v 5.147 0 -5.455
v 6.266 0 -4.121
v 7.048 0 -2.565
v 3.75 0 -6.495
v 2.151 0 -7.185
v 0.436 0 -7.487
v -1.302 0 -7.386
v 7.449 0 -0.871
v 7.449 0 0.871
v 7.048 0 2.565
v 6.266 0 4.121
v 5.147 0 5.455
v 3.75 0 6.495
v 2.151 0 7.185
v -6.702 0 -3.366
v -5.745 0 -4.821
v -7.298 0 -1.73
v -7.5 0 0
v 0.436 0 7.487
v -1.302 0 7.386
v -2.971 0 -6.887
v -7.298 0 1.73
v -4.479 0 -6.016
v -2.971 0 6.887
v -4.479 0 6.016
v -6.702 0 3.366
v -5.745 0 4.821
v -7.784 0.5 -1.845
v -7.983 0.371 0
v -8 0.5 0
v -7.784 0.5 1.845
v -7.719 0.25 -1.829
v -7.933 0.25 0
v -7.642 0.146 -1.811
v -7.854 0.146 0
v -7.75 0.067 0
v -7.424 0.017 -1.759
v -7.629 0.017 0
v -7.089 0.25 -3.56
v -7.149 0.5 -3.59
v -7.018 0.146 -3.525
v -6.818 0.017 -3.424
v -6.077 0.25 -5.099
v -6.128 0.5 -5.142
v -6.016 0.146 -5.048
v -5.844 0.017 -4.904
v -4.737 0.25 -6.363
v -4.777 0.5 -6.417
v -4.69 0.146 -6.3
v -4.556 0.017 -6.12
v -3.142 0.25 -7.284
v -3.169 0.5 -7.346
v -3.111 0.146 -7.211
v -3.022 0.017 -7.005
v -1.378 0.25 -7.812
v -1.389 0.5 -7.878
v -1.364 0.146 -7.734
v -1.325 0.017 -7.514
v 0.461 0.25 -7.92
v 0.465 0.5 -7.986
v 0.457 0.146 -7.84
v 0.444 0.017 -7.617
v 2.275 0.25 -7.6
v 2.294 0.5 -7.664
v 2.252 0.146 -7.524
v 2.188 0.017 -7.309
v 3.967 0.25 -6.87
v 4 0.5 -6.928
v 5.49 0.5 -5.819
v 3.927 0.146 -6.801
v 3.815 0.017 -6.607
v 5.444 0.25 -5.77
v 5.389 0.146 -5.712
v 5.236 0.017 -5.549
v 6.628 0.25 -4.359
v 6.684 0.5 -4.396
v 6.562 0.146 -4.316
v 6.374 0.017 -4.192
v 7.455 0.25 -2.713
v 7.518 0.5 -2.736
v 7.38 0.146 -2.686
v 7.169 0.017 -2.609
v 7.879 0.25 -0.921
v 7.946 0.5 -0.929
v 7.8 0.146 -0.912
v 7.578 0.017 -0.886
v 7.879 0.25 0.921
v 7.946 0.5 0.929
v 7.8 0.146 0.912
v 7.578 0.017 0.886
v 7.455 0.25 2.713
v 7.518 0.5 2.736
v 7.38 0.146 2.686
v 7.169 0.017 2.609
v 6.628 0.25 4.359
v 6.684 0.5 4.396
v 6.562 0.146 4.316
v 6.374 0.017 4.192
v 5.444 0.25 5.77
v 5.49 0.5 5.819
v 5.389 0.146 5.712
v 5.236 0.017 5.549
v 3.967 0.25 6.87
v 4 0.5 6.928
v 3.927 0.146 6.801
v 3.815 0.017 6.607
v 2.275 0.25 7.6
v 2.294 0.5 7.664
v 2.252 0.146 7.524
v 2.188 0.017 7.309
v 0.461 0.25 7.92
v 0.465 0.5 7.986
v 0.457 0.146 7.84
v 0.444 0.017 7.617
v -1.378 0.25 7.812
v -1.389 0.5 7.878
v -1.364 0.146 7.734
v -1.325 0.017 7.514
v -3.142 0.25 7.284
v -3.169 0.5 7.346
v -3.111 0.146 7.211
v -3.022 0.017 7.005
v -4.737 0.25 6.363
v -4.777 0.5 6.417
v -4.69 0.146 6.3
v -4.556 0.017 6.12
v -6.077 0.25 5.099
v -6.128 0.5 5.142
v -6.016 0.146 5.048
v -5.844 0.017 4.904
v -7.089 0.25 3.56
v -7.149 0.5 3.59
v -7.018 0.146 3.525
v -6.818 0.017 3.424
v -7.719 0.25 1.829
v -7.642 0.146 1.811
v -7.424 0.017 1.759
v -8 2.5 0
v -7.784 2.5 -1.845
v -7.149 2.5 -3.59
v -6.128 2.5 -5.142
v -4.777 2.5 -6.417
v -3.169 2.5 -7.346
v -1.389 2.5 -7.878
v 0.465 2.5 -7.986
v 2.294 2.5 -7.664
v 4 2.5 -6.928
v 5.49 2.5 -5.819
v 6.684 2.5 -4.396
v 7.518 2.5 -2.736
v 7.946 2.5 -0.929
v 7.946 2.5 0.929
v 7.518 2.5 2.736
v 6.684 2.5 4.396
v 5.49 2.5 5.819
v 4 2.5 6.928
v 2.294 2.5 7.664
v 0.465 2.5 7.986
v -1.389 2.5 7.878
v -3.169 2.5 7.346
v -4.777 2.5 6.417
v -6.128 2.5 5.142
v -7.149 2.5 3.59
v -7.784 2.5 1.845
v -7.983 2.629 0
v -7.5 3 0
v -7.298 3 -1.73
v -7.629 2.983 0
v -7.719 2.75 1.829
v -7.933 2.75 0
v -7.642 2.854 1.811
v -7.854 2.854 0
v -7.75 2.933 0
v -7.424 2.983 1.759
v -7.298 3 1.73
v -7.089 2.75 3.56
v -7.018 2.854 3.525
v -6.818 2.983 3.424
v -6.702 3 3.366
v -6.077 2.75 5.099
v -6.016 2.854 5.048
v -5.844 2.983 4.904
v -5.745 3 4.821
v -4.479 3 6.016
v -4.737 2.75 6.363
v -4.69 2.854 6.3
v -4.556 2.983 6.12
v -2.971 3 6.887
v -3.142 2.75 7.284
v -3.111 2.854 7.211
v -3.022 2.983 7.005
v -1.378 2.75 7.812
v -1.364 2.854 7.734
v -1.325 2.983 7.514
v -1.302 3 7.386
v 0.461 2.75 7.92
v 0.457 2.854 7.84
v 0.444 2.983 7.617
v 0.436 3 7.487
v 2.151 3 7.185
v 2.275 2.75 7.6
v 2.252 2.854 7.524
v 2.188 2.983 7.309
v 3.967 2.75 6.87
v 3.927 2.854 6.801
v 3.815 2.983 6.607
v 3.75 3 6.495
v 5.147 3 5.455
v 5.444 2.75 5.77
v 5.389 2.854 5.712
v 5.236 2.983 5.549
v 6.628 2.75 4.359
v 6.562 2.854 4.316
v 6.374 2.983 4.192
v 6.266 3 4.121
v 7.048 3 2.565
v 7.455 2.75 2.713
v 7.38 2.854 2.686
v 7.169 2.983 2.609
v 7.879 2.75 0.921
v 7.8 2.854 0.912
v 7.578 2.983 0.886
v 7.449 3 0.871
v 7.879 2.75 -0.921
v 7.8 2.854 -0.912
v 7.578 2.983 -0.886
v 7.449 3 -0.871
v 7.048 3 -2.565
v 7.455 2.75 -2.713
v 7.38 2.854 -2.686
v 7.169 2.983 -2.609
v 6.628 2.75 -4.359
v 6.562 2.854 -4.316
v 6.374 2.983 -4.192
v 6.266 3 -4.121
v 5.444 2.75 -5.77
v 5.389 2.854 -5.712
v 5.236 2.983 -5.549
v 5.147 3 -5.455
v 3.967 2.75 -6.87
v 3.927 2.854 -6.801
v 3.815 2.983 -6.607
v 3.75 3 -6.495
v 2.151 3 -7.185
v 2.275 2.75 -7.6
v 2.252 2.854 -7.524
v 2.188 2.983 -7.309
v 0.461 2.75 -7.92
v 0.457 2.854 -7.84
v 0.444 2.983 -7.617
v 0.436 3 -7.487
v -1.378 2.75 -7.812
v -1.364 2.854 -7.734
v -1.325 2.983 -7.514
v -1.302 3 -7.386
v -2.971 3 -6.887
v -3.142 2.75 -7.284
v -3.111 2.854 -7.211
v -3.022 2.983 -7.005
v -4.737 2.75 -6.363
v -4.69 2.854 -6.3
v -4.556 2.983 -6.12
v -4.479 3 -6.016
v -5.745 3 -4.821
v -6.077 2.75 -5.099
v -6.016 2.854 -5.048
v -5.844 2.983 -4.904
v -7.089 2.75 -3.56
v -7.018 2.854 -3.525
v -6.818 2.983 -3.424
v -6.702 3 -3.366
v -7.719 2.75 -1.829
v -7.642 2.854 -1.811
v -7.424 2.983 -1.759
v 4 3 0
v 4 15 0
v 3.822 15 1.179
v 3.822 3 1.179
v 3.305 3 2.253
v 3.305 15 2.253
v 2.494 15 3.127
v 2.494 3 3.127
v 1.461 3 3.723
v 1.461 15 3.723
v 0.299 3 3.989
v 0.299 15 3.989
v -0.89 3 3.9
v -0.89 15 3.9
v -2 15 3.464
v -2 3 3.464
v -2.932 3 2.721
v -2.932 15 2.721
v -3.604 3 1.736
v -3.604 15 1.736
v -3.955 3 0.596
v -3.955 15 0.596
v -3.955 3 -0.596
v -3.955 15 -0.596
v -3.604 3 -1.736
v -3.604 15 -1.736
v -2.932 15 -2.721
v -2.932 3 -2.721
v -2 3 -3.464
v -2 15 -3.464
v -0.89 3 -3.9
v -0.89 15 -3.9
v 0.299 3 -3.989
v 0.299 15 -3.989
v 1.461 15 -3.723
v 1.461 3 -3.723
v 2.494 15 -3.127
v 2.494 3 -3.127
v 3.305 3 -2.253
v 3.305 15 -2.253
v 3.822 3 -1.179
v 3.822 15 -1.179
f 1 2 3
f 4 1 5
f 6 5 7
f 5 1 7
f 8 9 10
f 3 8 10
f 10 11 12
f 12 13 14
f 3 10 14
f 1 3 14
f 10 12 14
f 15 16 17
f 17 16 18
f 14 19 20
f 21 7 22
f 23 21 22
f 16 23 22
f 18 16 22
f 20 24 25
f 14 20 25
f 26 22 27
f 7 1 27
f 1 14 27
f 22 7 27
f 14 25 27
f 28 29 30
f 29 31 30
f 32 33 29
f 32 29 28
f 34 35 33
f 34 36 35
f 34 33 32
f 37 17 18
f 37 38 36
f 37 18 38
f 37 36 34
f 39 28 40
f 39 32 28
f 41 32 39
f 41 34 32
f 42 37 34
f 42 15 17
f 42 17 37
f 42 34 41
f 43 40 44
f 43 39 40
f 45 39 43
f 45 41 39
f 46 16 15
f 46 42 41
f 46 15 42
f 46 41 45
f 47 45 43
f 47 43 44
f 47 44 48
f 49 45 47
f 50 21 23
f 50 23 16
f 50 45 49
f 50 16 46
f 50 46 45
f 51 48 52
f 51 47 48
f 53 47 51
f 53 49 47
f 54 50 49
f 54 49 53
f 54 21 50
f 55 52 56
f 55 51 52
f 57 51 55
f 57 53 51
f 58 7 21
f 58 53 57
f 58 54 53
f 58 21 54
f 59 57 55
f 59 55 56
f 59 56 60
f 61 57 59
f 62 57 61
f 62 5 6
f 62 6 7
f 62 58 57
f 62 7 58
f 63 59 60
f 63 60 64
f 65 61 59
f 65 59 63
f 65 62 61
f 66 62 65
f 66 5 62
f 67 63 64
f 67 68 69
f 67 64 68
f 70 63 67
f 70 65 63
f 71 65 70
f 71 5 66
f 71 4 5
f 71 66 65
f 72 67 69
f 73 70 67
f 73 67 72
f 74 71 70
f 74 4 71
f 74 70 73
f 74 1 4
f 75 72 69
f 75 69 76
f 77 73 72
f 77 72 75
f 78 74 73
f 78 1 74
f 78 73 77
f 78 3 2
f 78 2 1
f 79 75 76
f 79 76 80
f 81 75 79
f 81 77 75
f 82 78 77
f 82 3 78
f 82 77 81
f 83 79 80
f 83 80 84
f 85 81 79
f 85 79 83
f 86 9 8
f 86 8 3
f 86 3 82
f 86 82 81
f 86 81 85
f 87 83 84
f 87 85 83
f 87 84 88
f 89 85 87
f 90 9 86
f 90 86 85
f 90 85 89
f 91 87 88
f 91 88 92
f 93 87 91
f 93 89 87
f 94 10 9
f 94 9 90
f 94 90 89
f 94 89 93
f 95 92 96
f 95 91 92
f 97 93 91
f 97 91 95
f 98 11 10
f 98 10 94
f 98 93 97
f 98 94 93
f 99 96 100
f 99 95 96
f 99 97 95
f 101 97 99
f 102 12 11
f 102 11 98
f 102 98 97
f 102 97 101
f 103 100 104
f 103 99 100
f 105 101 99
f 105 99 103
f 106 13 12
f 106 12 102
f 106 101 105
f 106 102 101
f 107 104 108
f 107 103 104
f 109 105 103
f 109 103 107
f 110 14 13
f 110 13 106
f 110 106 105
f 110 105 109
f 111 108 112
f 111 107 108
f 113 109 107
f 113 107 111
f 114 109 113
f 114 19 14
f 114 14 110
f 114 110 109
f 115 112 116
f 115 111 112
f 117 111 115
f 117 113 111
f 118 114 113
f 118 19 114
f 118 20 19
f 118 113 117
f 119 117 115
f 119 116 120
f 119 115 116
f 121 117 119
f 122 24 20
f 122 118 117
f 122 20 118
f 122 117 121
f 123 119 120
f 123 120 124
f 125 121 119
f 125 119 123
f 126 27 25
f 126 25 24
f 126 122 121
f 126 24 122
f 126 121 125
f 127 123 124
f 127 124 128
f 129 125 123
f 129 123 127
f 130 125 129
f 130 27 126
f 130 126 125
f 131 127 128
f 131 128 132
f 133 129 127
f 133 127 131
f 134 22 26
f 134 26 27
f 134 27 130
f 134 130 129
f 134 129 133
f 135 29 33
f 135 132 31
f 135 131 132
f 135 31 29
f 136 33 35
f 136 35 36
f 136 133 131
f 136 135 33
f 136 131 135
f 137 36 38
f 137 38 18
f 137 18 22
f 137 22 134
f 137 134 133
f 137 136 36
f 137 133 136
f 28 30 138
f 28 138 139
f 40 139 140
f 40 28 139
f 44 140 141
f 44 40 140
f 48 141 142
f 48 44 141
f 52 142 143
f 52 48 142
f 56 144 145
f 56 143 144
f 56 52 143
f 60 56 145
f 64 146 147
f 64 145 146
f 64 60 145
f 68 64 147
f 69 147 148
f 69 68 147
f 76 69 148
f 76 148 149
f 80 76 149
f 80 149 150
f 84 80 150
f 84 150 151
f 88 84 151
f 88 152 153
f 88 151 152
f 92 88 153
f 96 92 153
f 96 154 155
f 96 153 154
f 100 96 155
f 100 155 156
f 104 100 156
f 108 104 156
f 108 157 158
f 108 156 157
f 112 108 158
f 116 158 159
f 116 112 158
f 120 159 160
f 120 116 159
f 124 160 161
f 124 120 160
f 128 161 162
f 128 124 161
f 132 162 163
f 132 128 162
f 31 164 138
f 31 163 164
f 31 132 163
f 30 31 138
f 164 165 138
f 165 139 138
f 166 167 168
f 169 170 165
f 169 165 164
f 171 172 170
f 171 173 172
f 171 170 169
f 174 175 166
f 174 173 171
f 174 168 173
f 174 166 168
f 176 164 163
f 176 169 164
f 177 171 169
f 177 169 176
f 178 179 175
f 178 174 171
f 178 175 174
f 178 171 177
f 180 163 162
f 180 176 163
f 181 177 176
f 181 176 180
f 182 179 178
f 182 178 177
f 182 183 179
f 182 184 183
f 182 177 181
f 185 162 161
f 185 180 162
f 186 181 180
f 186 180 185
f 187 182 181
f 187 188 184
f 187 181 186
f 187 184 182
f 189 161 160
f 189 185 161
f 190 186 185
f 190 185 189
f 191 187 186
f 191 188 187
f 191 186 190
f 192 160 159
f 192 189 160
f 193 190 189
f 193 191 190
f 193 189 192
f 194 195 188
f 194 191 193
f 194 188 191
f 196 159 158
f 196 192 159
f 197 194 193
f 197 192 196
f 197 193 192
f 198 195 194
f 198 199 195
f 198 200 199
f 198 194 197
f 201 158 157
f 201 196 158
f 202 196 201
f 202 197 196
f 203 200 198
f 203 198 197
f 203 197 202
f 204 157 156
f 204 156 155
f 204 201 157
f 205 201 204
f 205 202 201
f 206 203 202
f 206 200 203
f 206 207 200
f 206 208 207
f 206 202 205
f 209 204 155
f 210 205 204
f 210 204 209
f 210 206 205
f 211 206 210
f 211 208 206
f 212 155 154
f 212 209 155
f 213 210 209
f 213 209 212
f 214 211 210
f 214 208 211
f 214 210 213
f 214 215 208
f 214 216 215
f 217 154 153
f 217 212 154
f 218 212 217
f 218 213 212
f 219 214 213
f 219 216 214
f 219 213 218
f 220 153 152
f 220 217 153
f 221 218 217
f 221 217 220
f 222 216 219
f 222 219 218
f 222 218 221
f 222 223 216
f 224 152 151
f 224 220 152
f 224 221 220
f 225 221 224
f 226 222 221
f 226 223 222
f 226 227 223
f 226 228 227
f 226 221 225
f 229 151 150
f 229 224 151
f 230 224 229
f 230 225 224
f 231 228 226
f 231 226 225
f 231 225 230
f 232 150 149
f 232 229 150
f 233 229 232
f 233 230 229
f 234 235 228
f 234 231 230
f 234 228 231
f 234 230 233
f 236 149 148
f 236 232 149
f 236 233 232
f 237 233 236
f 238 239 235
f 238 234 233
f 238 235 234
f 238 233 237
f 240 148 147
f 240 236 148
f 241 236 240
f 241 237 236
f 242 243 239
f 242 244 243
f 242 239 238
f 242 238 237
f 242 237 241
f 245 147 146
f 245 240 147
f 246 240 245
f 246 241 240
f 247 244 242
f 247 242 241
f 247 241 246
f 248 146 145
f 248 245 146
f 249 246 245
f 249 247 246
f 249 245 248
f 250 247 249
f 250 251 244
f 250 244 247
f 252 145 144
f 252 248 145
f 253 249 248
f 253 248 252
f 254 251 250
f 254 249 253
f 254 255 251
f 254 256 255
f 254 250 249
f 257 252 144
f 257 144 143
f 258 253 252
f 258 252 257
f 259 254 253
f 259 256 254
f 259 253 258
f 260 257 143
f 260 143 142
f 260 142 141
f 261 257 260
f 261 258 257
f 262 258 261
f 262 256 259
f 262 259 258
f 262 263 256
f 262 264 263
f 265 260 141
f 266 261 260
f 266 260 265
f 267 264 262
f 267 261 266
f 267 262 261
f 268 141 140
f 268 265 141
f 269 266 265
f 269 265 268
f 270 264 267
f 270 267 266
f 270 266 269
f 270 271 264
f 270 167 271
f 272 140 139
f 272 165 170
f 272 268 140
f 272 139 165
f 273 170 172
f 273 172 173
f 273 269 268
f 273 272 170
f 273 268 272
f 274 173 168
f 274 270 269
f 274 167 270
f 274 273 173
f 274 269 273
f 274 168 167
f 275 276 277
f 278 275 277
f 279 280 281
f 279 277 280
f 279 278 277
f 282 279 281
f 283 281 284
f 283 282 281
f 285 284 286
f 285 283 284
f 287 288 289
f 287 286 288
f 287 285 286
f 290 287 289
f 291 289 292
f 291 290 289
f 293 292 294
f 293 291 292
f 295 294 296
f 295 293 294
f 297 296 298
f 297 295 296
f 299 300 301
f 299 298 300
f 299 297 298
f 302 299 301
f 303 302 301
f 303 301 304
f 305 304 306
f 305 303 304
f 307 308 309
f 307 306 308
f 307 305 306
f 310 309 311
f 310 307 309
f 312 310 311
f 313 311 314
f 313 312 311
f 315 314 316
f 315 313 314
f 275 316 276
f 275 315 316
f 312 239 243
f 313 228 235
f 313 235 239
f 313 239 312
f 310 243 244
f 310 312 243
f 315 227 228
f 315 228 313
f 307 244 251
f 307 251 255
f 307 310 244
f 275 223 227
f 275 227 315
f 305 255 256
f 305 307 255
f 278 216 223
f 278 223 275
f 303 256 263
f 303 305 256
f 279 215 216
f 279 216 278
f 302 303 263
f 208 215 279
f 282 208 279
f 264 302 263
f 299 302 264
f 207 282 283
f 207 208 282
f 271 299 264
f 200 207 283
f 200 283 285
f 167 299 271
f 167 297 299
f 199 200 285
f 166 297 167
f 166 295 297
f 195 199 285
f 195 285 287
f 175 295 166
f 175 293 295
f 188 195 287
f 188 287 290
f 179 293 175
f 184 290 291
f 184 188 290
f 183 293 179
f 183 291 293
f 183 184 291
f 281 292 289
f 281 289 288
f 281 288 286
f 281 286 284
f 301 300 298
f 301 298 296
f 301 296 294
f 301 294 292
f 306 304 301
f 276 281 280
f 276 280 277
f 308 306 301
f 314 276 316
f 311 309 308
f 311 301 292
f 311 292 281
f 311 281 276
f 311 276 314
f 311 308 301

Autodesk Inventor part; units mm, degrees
ref_plane "YZ Plane" through (0, 0, 0) normal (1, 0, 0) x (0, 1, 0)
ref_plane "XZ Plane" through (0, 0, 0) normal (0, 1, 0) x (-1, 0, 0)
ref_plane "XY Plane" through (0, 0, 0) normal (0, 0, 1) x (1, 0, 0)
sketch "Sketch1" plane through (0, 0, 0) normal (0, 1, 0) x (-1, 0, 0)
  circle A0 centre (0, 0) radius 8
  dimension "d0" = 16
extrude "Extrusion1" add sketch "Sketch1" along normal blind 3
sketch "Sketch2" plane through (0, 3, 0) normal (0, 1, 0) x (1, 0, 0)
  circle A0 centre (0, 0) radius 4
  dimension "d3" = 8
extrude "Extrusion2" add sketch "Sketch2" along normal blind 12
fillet "Fillet1" radius 0.5 2 edges at (8, 3, 0) (8, 0, 0)
thread "Thread2" size "M8x1.25" class "6g" standard "ANSI Metric M Profile" full length
properties part number "M3_12mm"
